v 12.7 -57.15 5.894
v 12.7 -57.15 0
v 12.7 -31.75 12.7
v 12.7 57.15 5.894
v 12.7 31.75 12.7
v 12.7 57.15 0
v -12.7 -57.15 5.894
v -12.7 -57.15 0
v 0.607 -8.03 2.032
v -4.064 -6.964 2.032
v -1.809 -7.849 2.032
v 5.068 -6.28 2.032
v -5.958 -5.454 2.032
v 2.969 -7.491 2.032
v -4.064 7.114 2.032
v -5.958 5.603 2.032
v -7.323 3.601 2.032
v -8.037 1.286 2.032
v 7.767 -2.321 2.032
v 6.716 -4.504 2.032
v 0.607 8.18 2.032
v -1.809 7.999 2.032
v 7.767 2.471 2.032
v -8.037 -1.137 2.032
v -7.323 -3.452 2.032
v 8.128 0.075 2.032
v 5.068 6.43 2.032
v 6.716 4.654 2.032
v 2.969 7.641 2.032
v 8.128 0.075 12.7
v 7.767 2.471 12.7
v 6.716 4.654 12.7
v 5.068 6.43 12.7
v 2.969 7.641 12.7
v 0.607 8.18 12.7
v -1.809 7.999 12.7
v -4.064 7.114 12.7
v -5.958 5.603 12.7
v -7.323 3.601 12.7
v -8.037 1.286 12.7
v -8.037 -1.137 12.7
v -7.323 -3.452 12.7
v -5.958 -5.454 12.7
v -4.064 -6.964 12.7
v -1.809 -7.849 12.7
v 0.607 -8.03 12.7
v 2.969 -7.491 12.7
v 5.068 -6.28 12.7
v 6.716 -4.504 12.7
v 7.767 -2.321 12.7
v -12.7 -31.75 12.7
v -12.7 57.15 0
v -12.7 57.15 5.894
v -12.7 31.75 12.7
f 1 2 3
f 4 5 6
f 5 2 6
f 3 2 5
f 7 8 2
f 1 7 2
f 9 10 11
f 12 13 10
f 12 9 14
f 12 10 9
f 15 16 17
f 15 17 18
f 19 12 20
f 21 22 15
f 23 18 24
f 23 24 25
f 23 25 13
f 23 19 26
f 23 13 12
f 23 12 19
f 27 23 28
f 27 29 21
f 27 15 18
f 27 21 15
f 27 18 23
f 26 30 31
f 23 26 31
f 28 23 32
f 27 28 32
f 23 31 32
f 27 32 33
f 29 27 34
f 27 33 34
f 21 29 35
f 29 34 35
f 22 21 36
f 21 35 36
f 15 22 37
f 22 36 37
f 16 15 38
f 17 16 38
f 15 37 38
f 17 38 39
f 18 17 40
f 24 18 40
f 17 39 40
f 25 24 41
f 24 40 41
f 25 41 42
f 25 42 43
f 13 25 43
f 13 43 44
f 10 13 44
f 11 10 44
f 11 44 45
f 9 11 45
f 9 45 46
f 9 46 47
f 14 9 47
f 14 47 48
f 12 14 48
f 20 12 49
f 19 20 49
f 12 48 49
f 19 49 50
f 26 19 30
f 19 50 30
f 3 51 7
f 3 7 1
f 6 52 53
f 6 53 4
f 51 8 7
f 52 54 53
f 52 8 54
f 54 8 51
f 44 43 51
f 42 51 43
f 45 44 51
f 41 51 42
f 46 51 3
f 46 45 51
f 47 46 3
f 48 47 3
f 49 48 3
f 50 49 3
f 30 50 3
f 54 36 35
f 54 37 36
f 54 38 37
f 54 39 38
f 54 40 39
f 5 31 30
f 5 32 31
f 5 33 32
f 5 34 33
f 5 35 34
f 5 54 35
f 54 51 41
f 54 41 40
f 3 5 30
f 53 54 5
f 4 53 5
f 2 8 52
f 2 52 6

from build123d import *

# Parameters (mm, degrees)
F0_W     = 25.4
F0_H     = 114.3
F1_DEPTH = 12.7
F2_R     = 8.128
F3_DEPTH = 10.668
F4_SIZE2 = 6.8059094878
F4_SIZE  = 25.4
F5_SIZE2 = 6.8059094878
F5_SIZE  = 25.4


with BuildPart() as f1:
    # F0 (on Top) → F1 (new body)
    with BuildSketch(Plane.XY):
        Rectangle(F0_W, F0_H)
    extrude(amount=F1_DEPTH)

    # F2 (on face) → F3 (cut)
    with BuildSketch(Plane.XY.offset(12.7)):
        with Locations((0, 0.0748441894)):
            Circle(F2_R)
    extrude(amount=-F3_DEPTH, mode=Mode.SUBTRACT)

    # F4
    f4_edges = [f1.edges().sort_by_distance(p)[0] for p in [
        (0, 57.15, 12.7),
    ]]
    f4_side = f1.faces().sort_by_distance((11.529118, 0, 12.7))[0]
    chamfer(f4_edges, length=F4_SIZE, length2=F4_SIZE2, reference=f4_side)

    # F5
    f5_edges = [f1.edges().sort_by_distance(p)[0] for p in [
        (0, -57.15, 12.7),
    ]]
    f5_side = f1.faces().sort_by_distance((0, -13.993035, 12.7))[0]
    chamfer(f5_edges, length=F5_SIZE, length2=F5_SIZE2, reference=f5_side)


solid = f1.part
